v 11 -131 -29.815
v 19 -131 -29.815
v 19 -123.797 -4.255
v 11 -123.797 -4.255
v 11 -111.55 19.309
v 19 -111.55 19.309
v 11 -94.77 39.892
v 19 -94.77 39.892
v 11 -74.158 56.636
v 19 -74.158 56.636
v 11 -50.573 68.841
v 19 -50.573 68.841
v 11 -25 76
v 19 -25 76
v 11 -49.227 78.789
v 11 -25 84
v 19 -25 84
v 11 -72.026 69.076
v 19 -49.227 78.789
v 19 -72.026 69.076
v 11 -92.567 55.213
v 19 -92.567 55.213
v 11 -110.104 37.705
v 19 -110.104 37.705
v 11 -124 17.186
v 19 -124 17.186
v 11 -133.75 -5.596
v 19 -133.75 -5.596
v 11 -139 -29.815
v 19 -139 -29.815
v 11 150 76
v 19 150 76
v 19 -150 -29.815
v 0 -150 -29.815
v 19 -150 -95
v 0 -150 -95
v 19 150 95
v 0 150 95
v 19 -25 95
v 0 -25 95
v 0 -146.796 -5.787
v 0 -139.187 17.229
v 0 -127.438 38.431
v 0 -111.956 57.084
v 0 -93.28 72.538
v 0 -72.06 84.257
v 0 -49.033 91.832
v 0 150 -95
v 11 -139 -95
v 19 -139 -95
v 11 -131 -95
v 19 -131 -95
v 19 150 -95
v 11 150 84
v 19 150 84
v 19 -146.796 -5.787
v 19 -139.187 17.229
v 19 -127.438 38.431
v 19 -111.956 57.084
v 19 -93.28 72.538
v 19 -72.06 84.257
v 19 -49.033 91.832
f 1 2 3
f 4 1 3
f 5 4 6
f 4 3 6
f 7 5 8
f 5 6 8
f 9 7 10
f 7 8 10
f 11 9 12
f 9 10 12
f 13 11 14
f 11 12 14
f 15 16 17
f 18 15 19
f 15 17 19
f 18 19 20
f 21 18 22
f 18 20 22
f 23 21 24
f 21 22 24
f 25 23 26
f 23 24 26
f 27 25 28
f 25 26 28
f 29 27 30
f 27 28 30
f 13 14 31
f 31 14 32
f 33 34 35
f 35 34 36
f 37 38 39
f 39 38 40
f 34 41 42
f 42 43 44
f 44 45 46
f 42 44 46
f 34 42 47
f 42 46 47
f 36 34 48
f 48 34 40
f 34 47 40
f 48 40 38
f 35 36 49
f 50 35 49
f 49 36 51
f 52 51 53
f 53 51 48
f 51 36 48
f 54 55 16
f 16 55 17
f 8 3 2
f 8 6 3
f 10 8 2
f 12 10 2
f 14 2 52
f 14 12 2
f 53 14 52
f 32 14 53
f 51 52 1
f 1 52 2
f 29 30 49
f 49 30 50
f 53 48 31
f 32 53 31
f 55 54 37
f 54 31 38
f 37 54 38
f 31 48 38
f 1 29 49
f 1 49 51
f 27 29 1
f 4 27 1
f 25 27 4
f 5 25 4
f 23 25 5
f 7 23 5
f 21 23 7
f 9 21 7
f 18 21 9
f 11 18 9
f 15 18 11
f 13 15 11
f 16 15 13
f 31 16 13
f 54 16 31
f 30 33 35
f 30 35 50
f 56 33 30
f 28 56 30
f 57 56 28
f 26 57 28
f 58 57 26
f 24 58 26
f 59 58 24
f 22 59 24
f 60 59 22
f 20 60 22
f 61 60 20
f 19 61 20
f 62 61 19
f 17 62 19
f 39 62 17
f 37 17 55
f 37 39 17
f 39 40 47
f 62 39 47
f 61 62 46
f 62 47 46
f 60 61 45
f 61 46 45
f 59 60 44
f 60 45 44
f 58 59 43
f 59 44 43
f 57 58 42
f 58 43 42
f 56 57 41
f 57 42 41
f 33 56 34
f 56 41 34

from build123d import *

# Parameters (mm, degrees)
F1_DEPTH = 19
F3_DEPTH = 8


with BuildPart() as f1:
    # F0 (on Right) → F1 (new body)
    with BuildSketch(Plane.YZ):
        with BuildLine():
            Line((150, 95), (-25, 95))
            ThreePointArc((-25, 95), (-111.955644, 57.084235), (-150, -29.815225))
            Line((-150, -29.815225), (-150, -40))
            Line((-150, -40), (-150, -95))
            Line((-150, -95), (150, -95))
            Line((150, -95), (150, 95))
        make_face()
    extrude(amount=F1_DEPTH)

    # F2 (on face) → F3 (cut)
    with BuildSketch(Plane.YZ.offset(19)):
        with BuildLine():
            Line((150, 76), (150, 84))
            Line((150, 84), (-25, 84))
            ThreePointArc((-25, 84), (-101.75341, 46.877867), (-139, -29.815225))
            Line((-139, -29.815225), (-139, -95))
            Line((-139, -95), (-131, -95))
            Line((-131, -95), (-131, -29.815225))
            ThreePointArc((-131, -29.815225), (-94.770081, 39.891752), (-25, 76))
            Line((-25, 76), (150, 76))
        make_face()
    extrude(amount=-F3_DEPTH, mode=Mode.SUBTRACT)


solid = f1.part
